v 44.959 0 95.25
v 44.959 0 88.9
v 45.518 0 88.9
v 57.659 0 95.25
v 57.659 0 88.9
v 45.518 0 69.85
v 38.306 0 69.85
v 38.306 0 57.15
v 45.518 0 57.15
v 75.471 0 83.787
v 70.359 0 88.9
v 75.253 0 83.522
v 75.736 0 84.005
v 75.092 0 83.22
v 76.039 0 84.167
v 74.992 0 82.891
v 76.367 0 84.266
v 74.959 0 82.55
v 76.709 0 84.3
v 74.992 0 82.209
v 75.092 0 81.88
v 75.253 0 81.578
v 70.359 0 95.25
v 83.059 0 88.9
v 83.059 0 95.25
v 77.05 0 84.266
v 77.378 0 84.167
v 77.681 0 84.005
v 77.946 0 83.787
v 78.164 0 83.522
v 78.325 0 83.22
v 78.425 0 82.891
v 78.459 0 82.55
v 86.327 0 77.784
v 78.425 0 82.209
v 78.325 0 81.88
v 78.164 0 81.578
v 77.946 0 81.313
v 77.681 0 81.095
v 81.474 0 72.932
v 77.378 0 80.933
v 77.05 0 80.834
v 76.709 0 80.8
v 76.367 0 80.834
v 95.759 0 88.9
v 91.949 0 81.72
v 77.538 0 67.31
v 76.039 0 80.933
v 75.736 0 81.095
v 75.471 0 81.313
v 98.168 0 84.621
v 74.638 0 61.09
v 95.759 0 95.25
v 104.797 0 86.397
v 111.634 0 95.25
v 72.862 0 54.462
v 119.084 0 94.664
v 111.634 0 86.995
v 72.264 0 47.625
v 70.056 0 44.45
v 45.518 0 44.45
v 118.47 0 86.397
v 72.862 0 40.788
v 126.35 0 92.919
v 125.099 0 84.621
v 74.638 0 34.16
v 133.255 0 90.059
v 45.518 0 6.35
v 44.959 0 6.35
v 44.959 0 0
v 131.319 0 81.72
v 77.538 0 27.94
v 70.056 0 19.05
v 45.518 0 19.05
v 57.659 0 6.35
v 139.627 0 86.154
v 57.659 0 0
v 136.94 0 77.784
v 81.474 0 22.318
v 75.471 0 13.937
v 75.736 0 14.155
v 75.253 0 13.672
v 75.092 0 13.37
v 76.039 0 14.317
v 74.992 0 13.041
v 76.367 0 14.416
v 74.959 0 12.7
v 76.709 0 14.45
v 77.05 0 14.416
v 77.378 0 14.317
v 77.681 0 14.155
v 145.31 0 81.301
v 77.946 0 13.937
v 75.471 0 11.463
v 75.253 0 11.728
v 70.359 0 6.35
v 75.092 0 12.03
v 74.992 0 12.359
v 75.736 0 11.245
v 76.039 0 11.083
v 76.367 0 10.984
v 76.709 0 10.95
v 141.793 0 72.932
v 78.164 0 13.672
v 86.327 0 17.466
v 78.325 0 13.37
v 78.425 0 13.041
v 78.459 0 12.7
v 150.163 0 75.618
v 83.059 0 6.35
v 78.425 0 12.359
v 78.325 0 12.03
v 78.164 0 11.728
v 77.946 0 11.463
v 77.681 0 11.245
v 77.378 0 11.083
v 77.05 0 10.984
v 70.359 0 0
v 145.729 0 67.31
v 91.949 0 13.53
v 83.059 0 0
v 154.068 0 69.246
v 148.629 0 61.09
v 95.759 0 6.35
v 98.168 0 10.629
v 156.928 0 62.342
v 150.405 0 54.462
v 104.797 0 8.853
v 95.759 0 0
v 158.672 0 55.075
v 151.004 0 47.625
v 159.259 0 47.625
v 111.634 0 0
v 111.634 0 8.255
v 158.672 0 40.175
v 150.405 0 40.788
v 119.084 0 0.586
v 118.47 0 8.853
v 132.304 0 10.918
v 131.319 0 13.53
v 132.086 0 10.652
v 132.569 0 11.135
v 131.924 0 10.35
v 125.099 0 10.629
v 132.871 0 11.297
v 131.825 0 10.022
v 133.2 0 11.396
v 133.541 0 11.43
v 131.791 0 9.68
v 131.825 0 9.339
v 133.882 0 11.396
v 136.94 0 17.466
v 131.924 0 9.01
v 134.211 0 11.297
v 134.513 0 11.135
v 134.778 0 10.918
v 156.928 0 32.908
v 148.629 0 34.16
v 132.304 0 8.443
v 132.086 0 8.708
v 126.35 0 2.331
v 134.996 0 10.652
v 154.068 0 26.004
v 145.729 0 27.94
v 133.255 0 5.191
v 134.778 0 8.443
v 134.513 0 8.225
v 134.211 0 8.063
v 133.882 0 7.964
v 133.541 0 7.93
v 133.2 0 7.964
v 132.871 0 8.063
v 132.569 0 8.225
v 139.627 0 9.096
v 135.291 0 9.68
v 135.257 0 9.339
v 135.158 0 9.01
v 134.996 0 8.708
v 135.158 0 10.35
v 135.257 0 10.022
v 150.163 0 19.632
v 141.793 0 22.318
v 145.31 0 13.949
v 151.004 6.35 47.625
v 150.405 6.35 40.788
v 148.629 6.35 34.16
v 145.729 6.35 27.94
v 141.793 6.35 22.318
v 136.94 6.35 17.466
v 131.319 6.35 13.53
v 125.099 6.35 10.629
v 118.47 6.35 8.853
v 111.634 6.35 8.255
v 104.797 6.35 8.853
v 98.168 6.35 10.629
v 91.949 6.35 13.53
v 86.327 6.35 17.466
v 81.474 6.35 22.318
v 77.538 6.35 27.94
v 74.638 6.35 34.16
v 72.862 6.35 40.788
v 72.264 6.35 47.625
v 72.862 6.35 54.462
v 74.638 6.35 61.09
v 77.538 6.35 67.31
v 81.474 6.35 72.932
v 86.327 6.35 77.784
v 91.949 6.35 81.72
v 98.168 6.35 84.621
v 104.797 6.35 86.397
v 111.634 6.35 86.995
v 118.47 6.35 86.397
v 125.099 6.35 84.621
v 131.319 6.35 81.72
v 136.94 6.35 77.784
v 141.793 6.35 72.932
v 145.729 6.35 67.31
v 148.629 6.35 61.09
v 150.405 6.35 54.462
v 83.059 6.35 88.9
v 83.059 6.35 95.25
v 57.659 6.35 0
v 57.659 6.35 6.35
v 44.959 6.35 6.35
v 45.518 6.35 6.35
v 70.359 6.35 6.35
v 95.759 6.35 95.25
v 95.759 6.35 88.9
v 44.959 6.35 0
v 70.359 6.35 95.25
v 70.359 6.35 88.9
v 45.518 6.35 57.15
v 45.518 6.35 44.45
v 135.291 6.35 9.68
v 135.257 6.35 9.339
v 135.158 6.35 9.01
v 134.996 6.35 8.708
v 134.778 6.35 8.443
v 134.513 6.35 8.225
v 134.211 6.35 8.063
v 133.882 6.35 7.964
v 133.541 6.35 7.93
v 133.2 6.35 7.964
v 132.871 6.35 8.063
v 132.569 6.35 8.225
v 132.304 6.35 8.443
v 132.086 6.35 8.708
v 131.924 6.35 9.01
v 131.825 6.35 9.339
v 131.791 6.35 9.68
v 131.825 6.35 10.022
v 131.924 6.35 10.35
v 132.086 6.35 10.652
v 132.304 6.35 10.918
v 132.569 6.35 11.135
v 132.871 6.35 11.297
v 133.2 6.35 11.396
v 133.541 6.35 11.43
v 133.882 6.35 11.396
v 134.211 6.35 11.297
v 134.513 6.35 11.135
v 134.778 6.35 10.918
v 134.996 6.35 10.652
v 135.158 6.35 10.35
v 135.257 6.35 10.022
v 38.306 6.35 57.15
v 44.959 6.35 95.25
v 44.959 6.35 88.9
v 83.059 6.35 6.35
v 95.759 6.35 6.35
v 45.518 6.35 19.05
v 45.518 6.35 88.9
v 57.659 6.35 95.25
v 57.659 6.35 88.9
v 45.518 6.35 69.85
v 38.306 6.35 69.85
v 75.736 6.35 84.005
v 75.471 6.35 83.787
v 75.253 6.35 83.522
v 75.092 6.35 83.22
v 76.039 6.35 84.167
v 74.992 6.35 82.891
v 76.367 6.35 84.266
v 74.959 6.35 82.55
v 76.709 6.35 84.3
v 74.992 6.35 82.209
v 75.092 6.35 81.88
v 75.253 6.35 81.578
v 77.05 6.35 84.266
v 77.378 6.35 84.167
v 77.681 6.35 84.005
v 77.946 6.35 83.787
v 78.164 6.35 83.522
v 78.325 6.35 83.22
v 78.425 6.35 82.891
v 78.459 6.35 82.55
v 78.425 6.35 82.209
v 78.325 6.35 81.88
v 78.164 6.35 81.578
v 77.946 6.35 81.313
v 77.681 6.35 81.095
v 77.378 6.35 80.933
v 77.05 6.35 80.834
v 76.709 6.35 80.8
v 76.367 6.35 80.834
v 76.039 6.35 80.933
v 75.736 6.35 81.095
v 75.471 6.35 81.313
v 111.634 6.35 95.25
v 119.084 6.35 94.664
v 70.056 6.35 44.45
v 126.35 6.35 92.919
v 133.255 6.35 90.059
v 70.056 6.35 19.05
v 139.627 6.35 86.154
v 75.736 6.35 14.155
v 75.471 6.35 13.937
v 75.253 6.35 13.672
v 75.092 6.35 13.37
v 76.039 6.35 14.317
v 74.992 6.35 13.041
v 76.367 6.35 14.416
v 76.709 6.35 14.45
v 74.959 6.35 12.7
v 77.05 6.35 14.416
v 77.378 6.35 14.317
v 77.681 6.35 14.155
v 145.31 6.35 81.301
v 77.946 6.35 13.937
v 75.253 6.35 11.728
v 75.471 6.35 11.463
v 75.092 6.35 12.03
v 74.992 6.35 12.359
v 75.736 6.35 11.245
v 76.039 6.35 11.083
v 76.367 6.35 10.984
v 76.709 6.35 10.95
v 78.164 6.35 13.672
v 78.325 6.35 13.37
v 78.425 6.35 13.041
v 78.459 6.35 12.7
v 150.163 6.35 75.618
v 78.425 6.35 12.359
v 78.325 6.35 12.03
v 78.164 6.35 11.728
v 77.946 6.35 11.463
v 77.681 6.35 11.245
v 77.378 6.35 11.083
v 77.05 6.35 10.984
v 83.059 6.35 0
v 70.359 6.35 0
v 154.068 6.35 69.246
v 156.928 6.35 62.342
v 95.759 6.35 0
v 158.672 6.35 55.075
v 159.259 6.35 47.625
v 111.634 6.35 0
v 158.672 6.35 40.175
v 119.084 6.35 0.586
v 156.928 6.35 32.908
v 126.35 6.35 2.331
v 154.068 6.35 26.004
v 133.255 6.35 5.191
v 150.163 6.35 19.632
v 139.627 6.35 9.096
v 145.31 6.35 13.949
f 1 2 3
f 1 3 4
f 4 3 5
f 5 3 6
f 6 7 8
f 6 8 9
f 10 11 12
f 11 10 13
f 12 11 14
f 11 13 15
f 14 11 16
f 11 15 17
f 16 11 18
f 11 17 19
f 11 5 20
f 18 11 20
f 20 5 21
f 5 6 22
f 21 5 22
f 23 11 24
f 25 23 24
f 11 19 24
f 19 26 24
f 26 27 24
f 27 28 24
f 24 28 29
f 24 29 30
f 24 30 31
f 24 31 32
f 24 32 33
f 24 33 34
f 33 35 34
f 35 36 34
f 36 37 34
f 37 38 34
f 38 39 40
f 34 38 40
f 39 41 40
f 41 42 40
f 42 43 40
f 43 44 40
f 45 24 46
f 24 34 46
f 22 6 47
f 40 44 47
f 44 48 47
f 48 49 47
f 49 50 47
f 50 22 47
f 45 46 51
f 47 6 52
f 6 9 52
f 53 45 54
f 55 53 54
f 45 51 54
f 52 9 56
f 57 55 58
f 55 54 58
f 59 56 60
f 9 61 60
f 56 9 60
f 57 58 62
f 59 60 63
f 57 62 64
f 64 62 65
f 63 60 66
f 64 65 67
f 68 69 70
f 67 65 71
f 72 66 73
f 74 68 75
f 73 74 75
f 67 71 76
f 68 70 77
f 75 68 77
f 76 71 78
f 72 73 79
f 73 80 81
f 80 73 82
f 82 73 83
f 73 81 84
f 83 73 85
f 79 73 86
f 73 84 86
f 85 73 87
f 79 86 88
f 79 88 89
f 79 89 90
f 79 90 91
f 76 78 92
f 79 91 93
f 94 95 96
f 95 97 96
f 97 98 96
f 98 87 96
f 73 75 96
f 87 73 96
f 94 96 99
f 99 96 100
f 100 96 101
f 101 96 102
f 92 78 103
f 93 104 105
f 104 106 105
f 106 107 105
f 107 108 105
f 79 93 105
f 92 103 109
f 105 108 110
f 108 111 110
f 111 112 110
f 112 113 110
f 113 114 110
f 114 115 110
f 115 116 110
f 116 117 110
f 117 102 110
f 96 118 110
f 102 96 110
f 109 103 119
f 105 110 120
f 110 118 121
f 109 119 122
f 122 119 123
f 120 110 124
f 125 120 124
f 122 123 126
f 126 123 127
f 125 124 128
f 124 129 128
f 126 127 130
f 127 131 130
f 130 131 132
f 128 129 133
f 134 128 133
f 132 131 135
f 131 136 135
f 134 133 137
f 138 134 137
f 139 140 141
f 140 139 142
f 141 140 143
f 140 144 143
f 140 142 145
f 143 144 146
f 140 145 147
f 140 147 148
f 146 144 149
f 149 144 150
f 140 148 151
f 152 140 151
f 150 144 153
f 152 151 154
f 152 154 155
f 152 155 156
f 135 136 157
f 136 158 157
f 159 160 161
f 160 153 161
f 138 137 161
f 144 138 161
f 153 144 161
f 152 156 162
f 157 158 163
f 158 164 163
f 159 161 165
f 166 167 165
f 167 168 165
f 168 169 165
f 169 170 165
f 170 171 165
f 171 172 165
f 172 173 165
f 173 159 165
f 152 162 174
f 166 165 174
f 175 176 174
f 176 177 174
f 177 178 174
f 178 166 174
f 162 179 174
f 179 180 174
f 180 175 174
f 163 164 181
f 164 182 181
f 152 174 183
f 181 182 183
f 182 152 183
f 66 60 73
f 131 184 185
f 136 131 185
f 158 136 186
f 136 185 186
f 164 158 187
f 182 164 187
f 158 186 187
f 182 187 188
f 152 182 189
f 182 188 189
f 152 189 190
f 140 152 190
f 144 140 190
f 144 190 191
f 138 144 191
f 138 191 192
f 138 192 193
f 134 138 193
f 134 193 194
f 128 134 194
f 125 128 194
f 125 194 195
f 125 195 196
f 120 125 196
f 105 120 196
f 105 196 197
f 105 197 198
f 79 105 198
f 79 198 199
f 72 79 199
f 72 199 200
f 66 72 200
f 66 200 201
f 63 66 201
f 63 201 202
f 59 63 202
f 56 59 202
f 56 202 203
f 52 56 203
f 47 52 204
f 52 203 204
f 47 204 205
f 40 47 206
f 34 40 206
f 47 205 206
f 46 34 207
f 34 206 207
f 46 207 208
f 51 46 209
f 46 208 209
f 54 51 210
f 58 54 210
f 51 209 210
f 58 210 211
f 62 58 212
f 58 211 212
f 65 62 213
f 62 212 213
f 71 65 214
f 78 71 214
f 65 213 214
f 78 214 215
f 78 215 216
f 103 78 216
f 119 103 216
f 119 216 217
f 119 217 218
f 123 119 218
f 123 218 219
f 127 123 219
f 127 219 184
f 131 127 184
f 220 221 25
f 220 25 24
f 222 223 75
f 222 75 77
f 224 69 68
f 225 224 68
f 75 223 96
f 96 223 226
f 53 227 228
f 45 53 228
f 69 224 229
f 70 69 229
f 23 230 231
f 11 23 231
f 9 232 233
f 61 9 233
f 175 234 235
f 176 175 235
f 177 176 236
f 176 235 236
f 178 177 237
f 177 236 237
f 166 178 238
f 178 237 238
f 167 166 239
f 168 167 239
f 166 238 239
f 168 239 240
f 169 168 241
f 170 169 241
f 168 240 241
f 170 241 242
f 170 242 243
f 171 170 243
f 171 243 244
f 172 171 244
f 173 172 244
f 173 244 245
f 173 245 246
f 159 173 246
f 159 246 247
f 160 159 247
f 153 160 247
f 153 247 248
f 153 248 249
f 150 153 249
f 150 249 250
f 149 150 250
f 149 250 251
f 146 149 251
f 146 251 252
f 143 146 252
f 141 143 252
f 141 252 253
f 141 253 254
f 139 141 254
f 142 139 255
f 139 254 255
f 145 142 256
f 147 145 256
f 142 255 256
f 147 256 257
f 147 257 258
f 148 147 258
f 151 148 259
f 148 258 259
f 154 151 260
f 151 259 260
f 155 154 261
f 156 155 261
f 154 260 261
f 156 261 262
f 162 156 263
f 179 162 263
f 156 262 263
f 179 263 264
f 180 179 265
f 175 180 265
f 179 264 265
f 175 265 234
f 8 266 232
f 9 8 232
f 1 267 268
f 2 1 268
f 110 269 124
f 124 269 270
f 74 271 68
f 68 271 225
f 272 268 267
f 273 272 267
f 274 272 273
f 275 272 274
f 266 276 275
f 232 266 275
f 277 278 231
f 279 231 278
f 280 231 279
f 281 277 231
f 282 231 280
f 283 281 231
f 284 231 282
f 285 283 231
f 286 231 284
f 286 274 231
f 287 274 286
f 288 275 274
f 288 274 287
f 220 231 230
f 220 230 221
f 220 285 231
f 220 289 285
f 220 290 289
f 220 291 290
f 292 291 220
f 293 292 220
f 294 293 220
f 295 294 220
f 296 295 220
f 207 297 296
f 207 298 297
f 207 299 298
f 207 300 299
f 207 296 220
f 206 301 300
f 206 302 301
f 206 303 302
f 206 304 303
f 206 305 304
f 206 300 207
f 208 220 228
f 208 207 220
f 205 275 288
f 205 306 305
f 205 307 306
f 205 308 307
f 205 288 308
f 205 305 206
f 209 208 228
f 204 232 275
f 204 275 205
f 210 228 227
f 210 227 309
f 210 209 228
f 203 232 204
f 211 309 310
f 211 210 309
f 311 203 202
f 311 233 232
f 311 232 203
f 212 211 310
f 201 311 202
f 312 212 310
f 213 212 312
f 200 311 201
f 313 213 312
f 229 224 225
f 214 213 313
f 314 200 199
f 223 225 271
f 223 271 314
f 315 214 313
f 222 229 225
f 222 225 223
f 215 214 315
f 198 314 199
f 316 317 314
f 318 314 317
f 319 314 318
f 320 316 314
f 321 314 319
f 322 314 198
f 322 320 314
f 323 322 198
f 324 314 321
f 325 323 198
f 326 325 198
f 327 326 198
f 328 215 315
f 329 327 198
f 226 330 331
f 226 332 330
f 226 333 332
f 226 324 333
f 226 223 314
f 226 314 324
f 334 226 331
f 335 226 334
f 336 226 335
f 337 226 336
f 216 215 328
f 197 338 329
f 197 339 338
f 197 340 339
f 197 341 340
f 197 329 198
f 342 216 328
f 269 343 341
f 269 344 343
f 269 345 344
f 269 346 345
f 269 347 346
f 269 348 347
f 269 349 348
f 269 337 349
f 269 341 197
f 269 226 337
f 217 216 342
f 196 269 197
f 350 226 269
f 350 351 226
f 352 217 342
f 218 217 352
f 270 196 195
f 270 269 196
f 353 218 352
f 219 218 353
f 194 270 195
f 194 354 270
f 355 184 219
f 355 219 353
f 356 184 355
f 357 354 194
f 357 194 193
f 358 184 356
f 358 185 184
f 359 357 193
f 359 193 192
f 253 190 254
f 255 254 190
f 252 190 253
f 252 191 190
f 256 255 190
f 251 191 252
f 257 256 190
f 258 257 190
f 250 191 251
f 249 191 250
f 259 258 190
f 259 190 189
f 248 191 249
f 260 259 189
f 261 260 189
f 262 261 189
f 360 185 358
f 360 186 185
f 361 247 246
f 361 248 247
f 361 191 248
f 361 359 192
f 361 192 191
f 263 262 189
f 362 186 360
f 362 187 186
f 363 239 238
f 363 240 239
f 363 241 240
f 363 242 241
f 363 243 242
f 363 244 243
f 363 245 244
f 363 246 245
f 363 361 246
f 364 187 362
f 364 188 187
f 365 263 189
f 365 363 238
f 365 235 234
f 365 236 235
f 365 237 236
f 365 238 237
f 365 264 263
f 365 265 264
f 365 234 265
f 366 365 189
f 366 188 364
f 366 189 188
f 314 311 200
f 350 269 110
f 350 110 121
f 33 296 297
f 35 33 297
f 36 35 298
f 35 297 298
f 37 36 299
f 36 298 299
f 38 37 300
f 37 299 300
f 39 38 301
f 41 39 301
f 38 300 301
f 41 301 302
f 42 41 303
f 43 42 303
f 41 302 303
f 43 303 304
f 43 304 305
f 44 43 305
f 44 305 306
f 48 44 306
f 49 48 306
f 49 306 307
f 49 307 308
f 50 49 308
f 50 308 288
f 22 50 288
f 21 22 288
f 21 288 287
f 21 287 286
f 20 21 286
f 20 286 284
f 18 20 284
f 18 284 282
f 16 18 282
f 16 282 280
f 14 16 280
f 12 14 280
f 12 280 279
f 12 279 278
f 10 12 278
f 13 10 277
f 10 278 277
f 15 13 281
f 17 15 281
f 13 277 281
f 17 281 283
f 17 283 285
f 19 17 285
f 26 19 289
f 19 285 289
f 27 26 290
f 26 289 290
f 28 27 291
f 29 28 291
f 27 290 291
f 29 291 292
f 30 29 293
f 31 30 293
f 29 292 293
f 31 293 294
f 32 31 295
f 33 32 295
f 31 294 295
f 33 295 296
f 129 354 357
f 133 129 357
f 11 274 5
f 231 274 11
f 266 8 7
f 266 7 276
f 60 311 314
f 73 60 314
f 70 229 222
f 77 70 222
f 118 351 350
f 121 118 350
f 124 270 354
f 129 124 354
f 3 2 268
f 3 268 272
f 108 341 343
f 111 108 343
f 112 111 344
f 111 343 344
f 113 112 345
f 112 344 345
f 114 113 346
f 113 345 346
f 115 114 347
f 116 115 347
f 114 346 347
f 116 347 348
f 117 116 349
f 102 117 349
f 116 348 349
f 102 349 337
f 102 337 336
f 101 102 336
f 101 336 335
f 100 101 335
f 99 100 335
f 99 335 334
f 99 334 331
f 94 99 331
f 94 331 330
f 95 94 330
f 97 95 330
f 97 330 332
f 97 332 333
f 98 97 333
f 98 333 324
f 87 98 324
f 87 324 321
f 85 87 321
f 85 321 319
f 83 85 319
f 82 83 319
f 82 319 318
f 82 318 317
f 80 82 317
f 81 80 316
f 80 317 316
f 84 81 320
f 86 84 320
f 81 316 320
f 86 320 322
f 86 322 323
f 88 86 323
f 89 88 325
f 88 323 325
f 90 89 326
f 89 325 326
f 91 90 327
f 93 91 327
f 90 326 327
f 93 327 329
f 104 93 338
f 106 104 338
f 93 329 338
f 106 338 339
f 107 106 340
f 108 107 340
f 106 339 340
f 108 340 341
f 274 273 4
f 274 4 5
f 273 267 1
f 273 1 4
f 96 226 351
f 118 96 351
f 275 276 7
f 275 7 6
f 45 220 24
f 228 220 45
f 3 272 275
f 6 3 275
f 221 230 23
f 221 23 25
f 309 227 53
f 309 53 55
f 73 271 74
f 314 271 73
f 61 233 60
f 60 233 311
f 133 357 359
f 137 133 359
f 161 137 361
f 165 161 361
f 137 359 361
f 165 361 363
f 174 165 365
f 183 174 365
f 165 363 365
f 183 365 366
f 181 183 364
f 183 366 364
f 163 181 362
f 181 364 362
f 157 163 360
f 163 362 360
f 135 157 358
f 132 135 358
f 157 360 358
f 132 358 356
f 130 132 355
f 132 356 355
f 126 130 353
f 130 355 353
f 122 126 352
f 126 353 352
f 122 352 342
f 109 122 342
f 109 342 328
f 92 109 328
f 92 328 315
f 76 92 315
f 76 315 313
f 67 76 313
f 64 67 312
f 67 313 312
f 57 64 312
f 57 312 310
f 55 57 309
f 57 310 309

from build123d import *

# Parameters (mm, degrees)
SKETCH2_W           = 120.952956328
SKETCH2_H           = 6.35
BOSS_EXTRUDE1_DEPTH = 95.25
SKETCH3_R           = 39.37
CUT_EXTRUDE2_DEPTH  = 7.35
CUT_EXTRUDE3_DEPTH  = 7.35
SKETCH5_W           = 31.75
SKETCH5_H           = 25.4
CUT_EXTRUDE4_DEPTH  = 7.35
SKETCH6_W           = 12.7
SKETCH6_H           = 6.35
CUT_EXTRUDE5_DEPTH  = 7.35
LPATTERN1_COUNT     = 3
LPATTERN1_PITCH     = 25.4
SKETCH7_W           = 7.21259173
SKETCH7_H           = 12.7
SKETCH7_H_2         = 19.05
CUT_EXTRUDE6_DEPTH  = 7.35
SKETCH8_R           = 1.75
CUT_EXTRUDE7_DEPTH  = 7.35
SKETCH10_R          = 1.75
CUT_EXTRUDE9_DEPTH  = 7.35


with BuildPart() as part:
    # Sketch2 → Boss-Extrude1 (new body)
    with BuildSketch(Plane.XY):
        with Locations((98.782063621, 3.175)):
            Rectangle(SKETCH2_W, SKETCH2_H)
    extrude(amount=BOSS_EXTRUDE1_DEPTH)

    # Sketch3 → Cut-Extrude2 (cut, through all)
    with BuildSketch(Plane(origin=(0, 6.35, 0), x_dir=(1, 0, 0), z_dir=(0, 1, 0))):
        with Locations((111.633541785, -47.625)):
            Circle(SKETCH3_R)
    extrude(amount=-CUT_EXTRUDE2_DEPTH, mode=Mode.SUBTRACT)

    # Sketch4 → Cut-Extrude3 (cut, through all)
    with BuildSketch(Plane(origin=(0, 6.35, 0), x_dir=(1, 0, 0), z_dir=(0, 1, 0))):
        with BuildLine():
            Line((111.633541785, -95.25), (179.051442703, -95.25))
            Line((179.051442703, -95.25), (179.051442703, 0))
            Line((179.051442703, 0), (111.633541785, 0))
            ThreePointArc((111.633541785, 0), (159.258541785, -47.625), (111.633541785, -95.25))
        make_face()
    extrude(amount=-CUT_EXTRUDE3_DEPTH, mode=Mode.SUBTRACT)

    # Sketch5 → Cut-Extrude4 (cut, through all)
    with BuildSketch(Plane(origin=(0, 6.35, 0), x_dir=(1, 0, 0), z_dir=(0, 1, 0))):
        with Locations((54.180585457, -31.75)):
            Rectangle(SKETCH5_W, SKETCH5_H)
    extrude(amount=-CUT_EXTRUDE4_DEPTH, mode=Mode.SUBTRACT)

    # Sketch6 → Cut-Extrude5 (cut, through all)
    with BuildSketch(Plane(origin=(0, 6.35, 0), x_dir=(1, 0, 0), z_dir=(0, 1, 0))):
        with Locations((89.408541785, -3.175)):
            Rectangle(SKETCH6_W, SKETCH6_H)
        with Locations((89.408541785, -92.075)):
            Rectangle(SKETCH6_W, SKETCH6_H)
    cut_extrude5 = extrude(amount=-CUT_EXTRUDE5_DEPTH, mode=Mode.SUBTRACT)

    # LPattern1: Cut-Extrude5 ×3
    with Locations(*[(-i * LPATTERN1_PITCH, 0, 0) for i in range(1, LPATTERN1_COUNT)]):
        add(cut_extrude5, mode=Mode.SUBTRACT)

    # Sketch7 → Cut-Extrude6 (cut, through all)
    with BuildSketch(Plane(origin=(0, 6.35, 0), x_dir=(1, 0, 0), z_dir=(0, 1, 0))):
        with Locations((41.911881322, -12.7)):
            Rectangle(SKETCH7_W, SKETCH7_H)
        with Locations((41.911881322, -79.375)):
            Rectangle(SKETCH7_W, SKETCH7_H_2)
        with Locations((41.911881322, -50.8)):
            Rectangle(SKETCH7_W, SKETCH7_H)
    extrude(amount=-CUT_EXTRUDE6_DEPTH, mode=Mode.SUBTRACT)

    # Sketch8 → Cut-Extrude7 (cut, through all)
    with BuildSketch(Plane(origin=(0, 6.35, 0), x_dir=(1, 0, 0), z_dir=(0, 1, 0))):
        with Locations((76.708541785, -12.7)):
            Circle(SKETCH8_R)
        with Locations((76.708541785, -82.55)):
            Circle(SKETCH8_R)
    extrude(amount=-CUT_EXTRUDE7_DEPTH, mode=Mode.SUBTRACT)

    # Sketch10 → Cut-Extrude9 (cut, through all)
    with BuildSketch(Plane(origin=(0, 6.35, 0), x_dir=(1, 0, 0), z_dir=(0, 1, 0))):
        with Locations((133.541041785, -9.680096933)):
            Circle(SKETCH10_R)
    extrude(amount=-CUT_EXTRUDE9_DEPTH, mode=Mode.SUBTRACT)


solid = part.part
